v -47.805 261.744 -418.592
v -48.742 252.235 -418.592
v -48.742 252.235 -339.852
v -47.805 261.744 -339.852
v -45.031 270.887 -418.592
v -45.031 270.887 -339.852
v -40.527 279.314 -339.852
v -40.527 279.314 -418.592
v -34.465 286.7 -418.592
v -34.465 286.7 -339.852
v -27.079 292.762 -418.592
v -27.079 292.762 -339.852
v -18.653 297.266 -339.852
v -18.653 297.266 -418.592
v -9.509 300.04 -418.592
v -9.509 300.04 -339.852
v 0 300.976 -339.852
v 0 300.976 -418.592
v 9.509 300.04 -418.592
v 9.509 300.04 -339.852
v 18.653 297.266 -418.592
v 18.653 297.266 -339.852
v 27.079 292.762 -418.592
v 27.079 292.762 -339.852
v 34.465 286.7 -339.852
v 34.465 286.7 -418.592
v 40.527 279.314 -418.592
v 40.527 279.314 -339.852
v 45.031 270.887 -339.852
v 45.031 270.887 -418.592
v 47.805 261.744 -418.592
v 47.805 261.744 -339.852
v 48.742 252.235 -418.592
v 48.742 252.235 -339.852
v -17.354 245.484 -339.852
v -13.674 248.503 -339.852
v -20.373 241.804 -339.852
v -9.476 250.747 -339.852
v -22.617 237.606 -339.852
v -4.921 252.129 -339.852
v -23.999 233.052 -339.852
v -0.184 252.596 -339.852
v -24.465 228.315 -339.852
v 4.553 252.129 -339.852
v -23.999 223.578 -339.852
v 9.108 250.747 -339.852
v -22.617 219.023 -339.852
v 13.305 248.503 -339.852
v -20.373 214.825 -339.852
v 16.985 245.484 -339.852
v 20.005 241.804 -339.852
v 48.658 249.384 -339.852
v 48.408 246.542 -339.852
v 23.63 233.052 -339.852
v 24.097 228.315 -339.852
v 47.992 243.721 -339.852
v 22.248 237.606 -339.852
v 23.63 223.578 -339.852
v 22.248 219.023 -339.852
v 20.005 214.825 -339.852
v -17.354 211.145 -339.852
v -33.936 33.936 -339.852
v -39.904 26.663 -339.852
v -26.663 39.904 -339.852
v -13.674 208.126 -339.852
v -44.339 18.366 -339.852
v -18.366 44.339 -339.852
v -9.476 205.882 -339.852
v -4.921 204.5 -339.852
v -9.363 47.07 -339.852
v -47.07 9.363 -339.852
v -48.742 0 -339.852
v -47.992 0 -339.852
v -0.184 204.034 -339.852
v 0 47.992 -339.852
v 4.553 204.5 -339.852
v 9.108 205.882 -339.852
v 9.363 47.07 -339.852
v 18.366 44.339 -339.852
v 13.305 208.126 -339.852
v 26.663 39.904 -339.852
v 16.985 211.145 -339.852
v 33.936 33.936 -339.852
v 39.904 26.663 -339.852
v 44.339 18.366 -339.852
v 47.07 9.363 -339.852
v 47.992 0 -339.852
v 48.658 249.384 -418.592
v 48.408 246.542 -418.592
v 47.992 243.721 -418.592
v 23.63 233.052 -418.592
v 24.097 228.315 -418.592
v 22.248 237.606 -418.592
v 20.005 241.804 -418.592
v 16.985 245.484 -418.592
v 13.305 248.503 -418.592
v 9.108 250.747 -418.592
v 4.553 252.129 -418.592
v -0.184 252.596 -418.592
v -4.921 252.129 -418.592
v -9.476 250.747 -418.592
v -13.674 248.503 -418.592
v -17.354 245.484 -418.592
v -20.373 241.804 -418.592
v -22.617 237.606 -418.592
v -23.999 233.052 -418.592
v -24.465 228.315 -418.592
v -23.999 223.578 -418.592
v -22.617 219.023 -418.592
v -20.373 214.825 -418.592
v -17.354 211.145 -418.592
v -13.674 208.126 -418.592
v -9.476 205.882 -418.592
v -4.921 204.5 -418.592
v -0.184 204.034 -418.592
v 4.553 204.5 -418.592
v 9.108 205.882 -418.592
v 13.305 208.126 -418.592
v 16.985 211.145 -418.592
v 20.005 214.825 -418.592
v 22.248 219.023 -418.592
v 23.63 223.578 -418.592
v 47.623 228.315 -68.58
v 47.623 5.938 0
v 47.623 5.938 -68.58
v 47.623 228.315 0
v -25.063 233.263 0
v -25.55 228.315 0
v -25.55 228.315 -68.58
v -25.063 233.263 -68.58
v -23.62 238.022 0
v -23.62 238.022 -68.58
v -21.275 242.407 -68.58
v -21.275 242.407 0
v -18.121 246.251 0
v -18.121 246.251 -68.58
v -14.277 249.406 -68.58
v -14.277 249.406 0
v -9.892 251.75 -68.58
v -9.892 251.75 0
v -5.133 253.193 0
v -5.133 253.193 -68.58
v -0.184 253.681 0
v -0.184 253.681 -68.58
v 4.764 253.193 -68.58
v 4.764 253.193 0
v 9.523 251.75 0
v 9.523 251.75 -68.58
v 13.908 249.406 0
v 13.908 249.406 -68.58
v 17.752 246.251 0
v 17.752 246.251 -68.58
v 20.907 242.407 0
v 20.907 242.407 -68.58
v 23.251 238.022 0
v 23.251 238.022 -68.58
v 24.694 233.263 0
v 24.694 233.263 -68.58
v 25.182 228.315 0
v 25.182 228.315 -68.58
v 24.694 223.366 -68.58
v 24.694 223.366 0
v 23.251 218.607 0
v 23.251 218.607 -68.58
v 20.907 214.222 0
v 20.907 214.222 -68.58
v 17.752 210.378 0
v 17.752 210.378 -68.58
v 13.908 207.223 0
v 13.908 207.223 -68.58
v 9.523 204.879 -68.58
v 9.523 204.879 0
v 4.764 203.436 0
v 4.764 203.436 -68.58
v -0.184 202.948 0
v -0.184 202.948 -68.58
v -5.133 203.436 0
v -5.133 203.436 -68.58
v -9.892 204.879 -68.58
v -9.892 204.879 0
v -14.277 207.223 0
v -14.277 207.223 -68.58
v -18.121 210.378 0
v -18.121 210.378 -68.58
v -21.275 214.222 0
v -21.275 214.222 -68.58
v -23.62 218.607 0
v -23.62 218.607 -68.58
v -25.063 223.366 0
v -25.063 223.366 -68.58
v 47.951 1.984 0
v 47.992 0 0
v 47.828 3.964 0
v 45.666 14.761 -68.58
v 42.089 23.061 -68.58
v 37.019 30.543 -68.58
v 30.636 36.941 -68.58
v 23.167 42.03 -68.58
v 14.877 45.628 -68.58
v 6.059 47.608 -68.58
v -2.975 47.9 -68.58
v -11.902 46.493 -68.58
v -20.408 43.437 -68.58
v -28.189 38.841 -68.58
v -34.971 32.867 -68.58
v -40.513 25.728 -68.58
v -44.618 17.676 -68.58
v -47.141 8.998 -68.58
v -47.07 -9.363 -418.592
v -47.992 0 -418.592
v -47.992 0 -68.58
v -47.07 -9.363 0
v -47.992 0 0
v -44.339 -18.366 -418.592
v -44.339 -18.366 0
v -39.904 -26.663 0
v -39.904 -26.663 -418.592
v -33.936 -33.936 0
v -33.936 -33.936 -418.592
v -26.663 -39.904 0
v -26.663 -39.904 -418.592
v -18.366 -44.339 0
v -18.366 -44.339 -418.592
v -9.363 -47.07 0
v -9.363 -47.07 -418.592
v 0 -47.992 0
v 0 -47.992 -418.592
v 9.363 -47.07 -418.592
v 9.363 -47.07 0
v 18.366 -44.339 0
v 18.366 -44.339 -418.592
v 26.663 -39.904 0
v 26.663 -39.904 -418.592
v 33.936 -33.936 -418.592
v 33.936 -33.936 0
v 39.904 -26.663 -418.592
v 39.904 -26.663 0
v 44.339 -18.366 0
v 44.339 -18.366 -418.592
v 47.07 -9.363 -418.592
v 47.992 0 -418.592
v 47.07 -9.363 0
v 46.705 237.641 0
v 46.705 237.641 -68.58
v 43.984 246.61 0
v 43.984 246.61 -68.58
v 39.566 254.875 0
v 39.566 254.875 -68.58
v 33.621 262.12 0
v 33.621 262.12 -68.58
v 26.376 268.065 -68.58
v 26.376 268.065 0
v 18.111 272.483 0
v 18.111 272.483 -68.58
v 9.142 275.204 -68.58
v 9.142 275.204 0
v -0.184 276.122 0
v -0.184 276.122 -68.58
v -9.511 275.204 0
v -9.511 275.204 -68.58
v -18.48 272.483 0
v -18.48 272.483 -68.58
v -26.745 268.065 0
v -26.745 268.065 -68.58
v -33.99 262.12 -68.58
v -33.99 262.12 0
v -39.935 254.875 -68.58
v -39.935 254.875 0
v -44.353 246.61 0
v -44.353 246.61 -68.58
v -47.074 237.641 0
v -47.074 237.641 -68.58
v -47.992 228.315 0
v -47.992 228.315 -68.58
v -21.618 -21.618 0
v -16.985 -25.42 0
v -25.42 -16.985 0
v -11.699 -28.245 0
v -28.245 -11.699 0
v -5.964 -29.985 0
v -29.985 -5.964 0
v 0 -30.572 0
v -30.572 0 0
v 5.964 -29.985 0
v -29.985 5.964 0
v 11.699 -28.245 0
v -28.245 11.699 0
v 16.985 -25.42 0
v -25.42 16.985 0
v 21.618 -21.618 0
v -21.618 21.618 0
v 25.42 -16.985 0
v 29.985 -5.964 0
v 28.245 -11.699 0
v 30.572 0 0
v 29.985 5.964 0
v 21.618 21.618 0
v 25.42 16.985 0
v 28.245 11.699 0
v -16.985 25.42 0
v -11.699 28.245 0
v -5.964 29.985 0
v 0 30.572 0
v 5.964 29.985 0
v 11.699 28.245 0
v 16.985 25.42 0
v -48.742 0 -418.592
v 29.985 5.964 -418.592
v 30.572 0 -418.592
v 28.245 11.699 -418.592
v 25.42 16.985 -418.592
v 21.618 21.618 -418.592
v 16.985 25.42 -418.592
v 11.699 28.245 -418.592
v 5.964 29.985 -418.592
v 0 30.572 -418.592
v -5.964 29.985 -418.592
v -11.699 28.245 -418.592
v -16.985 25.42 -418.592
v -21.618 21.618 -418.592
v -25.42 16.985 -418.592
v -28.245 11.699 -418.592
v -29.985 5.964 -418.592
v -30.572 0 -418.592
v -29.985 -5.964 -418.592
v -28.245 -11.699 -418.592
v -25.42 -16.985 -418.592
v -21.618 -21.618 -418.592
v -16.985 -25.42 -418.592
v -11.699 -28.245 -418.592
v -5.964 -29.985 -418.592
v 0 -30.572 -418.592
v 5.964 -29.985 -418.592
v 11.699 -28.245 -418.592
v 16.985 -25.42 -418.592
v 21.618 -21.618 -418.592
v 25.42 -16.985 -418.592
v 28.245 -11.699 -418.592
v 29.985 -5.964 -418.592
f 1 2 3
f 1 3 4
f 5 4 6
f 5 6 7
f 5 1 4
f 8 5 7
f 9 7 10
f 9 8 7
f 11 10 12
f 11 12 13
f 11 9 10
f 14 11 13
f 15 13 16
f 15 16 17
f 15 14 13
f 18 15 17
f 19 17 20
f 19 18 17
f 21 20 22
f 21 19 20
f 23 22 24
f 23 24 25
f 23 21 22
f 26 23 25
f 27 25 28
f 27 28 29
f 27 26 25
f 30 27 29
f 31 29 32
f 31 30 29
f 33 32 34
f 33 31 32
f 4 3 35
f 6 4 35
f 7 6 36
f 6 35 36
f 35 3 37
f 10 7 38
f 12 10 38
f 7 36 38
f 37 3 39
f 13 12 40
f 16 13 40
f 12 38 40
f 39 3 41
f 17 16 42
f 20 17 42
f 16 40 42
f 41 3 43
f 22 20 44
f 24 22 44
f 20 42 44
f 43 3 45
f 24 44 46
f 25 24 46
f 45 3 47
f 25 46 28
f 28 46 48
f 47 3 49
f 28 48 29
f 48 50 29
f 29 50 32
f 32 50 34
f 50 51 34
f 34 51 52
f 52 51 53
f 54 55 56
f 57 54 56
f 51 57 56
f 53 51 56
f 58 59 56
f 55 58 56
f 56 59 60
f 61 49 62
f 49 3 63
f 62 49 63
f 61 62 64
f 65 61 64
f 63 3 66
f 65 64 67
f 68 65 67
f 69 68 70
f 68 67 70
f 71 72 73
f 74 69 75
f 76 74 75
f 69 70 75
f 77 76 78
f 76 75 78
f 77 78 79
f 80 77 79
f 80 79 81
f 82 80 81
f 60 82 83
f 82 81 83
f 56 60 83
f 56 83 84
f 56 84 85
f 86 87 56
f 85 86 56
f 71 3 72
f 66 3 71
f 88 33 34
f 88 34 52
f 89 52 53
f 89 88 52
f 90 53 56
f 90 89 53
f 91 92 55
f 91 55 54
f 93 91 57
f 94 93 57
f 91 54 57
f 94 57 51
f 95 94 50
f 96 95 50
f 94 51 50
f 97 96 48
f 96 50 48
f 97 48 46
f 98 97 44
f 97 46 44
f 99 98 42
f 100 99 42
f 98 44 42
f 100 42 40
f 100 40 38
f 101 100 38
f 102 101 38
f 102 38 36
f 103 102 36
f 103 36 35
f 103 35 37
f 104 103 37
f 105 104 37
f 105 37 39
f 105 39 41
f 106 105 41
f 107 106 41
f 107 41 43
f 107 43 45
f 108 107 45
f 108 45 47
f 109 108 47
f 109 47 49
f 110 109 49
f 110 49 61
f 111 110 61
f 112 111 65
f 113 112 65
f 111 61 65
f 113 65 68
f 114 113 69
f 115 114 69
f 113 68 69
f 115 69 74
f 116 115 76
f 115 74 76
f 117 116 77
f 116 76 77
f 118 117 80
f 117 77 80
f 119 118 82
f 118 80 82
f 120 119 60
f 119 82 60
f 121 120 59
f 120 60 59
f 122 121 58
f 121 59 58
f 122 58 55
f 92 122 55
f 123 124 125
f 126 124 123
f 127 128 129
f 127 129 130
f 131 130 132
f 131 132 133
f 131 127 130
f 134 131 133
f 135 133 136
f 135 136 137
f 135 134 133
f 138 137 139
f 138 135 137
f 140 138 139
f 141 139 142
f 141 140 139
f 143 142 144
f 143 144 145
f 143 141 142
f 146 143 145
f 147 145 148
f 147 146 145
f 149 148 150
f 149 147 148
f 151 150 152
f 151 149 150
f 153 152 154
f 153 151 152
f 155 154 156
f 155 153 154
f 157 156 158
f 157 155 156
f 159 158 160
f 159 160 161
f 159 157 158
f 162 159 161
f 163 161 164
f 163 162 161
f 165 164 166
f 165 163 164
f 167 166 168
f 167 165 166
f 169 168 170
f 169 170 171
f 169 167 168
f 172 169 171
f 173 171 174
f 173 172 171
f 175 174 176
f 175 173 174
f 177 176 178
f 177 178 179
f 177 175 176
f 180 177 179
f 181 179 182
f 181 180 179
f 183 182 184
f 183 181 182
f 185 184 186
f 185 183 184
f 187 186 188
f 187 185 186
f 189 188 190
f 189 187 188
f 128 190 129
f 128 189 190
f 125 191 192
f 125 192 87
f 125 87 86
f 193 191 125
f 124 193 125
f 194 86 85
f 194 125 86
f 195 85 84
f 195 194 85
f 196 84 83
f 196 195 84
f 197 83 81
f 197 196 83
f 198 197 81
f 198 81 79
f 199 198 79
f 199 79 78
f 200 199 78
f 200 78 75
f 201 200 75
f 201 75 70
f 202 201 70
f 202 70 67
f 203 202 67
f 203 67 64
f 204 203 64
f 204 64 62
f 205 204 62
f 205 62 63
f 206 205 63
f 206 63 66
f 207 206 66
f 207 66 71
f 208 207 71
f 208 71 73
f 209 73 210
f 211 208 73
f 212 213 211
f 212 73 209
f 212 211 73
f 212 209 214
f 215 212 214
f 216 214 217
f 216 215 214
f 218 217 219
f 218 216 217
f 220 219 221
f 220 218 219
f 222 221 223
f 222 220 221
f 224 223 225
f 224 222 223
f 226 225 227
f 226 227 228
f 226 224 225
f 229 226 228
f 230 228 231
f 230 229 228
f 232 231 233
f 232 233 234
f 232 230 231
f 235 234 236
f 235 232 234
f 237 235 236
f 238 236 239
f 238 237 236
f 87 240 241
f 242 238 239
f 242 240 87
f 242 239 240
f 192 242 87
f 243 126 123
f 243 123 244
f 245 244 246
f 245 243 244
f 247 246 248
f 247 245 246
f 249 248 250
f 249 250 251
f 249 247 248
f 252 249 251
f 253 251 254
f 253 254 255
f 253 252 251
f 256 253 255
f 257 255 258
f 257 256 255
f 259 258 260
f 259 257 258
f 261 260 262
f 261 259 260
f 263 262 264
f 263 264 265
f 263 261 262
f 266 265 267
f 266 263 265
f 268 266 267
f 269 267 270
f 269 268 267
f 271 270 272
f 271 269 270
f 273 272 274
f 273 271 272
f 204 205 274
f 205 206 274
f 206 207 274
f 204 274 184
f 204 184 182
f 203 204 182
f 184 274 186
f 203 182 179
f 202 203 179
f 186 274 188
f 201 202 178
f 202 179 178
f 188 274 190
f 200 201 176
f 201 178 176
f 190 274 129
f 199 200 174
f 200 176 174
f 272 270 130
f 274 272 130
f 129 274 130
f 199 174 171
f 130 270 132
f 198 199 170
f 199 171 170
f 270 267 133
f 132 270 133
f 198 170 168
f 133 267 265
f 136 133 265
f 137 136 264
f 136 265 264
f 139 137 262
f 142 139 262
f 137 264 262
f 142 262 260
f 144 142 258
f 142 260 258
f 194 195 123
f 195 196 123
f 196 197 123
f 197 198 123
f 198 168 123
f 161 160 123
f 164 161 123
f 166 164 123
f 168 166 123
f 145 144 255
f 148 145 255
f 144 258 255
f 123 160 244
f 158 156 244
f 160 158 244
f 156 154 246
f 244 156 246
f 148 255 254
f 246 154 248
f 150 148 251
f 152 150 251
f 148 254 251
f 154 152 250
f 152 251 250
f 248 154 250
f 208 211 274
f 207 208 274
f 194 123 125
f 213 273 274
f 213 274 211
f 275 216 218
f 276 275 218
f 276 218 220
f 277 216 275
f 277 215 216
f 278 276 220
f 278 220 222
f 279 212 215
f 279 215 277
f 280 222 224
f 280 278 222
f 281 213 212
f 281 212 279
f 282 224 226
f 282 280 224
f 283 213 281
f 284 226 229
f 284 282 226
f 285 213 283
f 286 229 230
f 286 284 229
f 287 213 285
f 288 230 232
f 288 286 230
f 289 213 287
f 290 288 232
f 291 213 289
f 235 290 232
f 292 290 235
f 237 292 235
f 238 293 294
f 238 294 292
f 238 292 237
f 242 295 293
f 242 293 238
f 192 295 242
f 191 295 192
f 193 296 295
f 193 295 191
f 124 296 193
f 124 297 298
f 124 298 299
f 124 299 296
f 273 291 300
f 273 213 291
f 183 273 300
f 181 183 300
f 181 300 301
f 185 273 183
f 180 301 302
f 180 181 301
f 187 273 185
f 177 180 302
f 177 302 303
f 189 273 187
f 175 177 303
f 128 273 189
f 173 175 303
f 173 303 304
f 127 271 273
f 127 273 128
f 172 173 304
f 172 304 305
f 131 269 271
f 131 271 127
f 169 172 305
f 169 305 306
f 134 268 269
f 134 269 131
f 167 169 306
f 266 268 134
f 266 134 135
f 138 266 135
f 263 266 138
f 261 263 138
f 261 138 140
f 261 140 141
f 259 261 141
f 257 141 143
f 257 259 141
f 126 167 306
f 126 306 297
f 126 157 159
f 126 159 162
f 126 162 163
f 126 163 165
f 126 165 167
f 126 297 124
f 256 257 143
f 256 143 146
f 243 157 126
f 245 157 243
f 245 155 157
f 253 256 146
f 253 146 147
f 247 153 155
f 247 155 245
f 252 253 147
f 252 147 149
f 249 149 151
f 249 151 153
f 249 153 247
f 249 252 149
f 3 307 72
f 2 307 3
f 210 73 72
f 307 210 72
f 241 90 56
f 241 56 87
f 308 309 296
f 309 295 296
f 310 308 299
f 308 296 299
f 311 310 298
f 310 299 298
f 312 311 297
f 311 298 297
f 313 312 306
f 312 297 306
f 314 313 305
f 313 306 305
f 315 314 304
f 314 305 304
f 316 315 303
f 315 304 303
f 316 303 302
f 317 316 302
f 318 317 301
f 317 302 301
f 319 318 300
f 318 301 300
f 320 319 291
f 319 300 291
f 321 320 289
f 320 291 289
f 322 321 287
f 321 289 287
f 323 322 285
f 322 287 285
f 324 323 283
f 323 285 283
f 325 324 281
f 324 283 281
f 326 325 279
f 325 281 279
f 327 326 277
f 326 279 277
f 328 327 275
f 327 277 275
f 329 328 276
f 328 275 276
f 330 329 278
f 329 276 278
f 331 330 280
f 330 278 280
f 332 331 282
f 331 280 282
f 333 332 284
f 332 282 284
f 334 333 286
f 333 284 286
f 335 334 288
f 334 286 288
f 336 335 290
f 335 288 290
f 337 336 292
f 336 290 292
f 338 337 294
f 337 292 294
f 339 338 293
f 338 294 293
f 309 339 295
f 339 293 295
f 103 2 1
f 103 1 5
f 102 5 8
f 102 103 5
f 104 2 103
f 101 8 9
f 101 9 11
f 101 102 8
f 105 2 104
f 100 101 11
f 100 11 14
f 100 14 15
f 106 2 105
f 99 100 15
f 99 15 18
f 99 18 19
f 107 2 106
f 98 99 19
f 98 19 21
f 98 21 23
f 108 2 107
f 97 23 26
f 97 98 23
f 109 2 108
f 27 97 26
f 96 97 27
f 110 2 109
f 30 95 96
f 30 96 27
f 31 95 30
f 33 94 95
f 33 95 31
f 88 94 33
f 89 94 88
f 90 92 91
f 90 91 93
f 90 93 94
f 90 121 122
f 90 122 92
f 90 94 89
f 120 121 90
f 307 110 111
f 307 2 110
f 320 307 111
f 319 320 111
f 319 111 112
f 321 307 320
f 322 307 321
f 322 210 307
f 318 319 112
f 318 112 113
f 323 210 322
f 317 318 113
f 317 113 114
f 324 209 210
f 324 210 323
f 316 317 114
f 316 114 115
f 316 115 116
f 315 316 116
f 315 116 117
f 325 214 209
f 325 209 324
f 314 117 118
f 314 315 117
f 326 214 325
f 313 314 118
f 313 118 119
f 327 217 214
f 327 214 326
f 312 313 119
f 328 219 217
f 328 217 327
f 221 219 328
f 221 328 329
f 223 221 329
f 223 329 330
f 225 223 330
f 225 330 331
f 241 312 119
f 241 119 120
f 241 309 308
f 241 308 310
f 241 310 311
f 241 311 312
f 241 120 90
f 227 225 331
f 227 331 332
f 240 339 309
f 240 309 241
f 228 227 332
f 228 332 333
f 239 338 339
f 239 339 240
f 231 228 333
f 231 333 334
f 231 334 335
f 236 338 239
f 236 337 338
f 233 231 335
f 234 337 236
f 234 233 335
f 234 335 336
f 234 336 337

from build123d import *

# Parameters (mm, degrees)
F0_R     = 47.9922028916
F0_R_2   = 30.5721704199
F1_DEPTH = 418.592
F3_DEPTH = 68.58
F5_DEPTH = 78.74
F6_R     = 30.5721704199
F6_R_2   = 24.281009231
F7_DEPTH = 495.3


with BuildPart() as f1:
    # F0 (on Top) → F1 (new body)
    with BuildSketch(Plane.XY):
        Circle(F0_R)
        Circle(F0_R_2, mode=Mode.SUBTRACT)
    extrude(amount=-F1_DEPTH)

    # F2 (on face) → F3 (join)
    with BuildSketch(Plane.XY):
        with BuildLine():
            Line((-47.9922028916, 228.3145189285), (-47.9922028916, 0))
            Line((-47.9922028916, 0), (47.6234853268, 0))
            Line((47.6234853268, 0), (47.6234853268, 228.3145189285))
            ThreePointArc((47.6234853268, 228.3145189285), (-0.1843587824, 180.5066748193), (-47.9922028916, 228.3145189285))
        make_face()
        with BuildLine():
            ThreePointArc((47.6234853268, 228.3145189285), (-0.1843587824, 276.1223630377), (-47.9922028916, 228.3145189285))
            Line((-47.9922028916, 228.3145189285), (-25.5504139221, 228.3145189285))
            ThreePointArc((-25.5504139221, 228.3145189285), (-0.1843587824, 253.6805740682), (25.1816963573, 228.3145189285))
            Line((25.1816963573, 228.3145189285), (47.6234853268, 228.3145189285))
        make_face()
        with BuildLine():
            Line((-25.5504139221, 228.3145189285), (-47.9922028916, 228.3145189285))
            ThreePointArc((-47.9922028916, 228.3145189285), (-0.1843587824, 180.5066748193), (47.6234853268, 228.3145189285))
            Line((47.6234853268, 228.3145189285), (25.1816963573, 228.3145189285))
            ThreePointArc((25.1816963573, 228.3145189285), (-0.1843587824, 202.9484637888), (-25.5504139221, 228.3145189285))
        make_face()
    extrude(amount=-F3_DEPTH)

    # F4 (on face) → F5 (join)
    with BuildSketch(Plane(origin=(0, 0, -418.592), x_dir=(1, 0, 0), z_dir=(0, 0, -1))):
        with BuildLine():
            Line((47.9922028916, -243.720613562), (47.9922028916, 0))
            Line((47.9922028916, 0), (-48.7415492535, 0))
            Line((-48.7415492535, 0), (-48.7415492535, -252.2345483303))
            ThreePointArc((-48.7415492535, -252.2345483303), (-4.2734238383, -203.6806970688), (47.9922028916, -243.720613562))
        make_face()
        with BuildLine():
            ThreePointArc((48.7415492535, -252.2345483303), (48.5538512615, -247.961124492), (47.9922028916, -243.720613562))
            Line((47.9922028916, -243.720613562), (47.9922028916, -252.2345483303))
            Line((47.9922028916, -252.2345483303), (-48.7415492535, -252.2345483303))
            ThreePointArc((-48.7415492535, -252.2345483303), (0, -300.9760975838), (48.7415492535, -252.2345483303))
        make_face()
        with BuildLine():
            Line((47.9922028916, -252.2345483303), (47.9922028916, -243.720613562))
            ThreePointArc((47.9922028916, -243.720613562), (-4.2734238383, -203.6806970688), (-48.7415492535, -252.2345483303))
            Line((-48.7415492535, -252.2345483303), (47.9922028916, -252.2345483303))
        make_face()
    extrude(amount=-F5_DEPTH)

    # F6 (on face) → F7 (cut)
    with BuildSketch(Plane.XY):
        Circle(F6_R)
        with Locations((-0.1843587824, 228.3145189285)):
            Circle(F6_R_2)
    extrude(amount=-F7_DEPTH, mode=Mode.SUBTRACT)


solid = f1.part
